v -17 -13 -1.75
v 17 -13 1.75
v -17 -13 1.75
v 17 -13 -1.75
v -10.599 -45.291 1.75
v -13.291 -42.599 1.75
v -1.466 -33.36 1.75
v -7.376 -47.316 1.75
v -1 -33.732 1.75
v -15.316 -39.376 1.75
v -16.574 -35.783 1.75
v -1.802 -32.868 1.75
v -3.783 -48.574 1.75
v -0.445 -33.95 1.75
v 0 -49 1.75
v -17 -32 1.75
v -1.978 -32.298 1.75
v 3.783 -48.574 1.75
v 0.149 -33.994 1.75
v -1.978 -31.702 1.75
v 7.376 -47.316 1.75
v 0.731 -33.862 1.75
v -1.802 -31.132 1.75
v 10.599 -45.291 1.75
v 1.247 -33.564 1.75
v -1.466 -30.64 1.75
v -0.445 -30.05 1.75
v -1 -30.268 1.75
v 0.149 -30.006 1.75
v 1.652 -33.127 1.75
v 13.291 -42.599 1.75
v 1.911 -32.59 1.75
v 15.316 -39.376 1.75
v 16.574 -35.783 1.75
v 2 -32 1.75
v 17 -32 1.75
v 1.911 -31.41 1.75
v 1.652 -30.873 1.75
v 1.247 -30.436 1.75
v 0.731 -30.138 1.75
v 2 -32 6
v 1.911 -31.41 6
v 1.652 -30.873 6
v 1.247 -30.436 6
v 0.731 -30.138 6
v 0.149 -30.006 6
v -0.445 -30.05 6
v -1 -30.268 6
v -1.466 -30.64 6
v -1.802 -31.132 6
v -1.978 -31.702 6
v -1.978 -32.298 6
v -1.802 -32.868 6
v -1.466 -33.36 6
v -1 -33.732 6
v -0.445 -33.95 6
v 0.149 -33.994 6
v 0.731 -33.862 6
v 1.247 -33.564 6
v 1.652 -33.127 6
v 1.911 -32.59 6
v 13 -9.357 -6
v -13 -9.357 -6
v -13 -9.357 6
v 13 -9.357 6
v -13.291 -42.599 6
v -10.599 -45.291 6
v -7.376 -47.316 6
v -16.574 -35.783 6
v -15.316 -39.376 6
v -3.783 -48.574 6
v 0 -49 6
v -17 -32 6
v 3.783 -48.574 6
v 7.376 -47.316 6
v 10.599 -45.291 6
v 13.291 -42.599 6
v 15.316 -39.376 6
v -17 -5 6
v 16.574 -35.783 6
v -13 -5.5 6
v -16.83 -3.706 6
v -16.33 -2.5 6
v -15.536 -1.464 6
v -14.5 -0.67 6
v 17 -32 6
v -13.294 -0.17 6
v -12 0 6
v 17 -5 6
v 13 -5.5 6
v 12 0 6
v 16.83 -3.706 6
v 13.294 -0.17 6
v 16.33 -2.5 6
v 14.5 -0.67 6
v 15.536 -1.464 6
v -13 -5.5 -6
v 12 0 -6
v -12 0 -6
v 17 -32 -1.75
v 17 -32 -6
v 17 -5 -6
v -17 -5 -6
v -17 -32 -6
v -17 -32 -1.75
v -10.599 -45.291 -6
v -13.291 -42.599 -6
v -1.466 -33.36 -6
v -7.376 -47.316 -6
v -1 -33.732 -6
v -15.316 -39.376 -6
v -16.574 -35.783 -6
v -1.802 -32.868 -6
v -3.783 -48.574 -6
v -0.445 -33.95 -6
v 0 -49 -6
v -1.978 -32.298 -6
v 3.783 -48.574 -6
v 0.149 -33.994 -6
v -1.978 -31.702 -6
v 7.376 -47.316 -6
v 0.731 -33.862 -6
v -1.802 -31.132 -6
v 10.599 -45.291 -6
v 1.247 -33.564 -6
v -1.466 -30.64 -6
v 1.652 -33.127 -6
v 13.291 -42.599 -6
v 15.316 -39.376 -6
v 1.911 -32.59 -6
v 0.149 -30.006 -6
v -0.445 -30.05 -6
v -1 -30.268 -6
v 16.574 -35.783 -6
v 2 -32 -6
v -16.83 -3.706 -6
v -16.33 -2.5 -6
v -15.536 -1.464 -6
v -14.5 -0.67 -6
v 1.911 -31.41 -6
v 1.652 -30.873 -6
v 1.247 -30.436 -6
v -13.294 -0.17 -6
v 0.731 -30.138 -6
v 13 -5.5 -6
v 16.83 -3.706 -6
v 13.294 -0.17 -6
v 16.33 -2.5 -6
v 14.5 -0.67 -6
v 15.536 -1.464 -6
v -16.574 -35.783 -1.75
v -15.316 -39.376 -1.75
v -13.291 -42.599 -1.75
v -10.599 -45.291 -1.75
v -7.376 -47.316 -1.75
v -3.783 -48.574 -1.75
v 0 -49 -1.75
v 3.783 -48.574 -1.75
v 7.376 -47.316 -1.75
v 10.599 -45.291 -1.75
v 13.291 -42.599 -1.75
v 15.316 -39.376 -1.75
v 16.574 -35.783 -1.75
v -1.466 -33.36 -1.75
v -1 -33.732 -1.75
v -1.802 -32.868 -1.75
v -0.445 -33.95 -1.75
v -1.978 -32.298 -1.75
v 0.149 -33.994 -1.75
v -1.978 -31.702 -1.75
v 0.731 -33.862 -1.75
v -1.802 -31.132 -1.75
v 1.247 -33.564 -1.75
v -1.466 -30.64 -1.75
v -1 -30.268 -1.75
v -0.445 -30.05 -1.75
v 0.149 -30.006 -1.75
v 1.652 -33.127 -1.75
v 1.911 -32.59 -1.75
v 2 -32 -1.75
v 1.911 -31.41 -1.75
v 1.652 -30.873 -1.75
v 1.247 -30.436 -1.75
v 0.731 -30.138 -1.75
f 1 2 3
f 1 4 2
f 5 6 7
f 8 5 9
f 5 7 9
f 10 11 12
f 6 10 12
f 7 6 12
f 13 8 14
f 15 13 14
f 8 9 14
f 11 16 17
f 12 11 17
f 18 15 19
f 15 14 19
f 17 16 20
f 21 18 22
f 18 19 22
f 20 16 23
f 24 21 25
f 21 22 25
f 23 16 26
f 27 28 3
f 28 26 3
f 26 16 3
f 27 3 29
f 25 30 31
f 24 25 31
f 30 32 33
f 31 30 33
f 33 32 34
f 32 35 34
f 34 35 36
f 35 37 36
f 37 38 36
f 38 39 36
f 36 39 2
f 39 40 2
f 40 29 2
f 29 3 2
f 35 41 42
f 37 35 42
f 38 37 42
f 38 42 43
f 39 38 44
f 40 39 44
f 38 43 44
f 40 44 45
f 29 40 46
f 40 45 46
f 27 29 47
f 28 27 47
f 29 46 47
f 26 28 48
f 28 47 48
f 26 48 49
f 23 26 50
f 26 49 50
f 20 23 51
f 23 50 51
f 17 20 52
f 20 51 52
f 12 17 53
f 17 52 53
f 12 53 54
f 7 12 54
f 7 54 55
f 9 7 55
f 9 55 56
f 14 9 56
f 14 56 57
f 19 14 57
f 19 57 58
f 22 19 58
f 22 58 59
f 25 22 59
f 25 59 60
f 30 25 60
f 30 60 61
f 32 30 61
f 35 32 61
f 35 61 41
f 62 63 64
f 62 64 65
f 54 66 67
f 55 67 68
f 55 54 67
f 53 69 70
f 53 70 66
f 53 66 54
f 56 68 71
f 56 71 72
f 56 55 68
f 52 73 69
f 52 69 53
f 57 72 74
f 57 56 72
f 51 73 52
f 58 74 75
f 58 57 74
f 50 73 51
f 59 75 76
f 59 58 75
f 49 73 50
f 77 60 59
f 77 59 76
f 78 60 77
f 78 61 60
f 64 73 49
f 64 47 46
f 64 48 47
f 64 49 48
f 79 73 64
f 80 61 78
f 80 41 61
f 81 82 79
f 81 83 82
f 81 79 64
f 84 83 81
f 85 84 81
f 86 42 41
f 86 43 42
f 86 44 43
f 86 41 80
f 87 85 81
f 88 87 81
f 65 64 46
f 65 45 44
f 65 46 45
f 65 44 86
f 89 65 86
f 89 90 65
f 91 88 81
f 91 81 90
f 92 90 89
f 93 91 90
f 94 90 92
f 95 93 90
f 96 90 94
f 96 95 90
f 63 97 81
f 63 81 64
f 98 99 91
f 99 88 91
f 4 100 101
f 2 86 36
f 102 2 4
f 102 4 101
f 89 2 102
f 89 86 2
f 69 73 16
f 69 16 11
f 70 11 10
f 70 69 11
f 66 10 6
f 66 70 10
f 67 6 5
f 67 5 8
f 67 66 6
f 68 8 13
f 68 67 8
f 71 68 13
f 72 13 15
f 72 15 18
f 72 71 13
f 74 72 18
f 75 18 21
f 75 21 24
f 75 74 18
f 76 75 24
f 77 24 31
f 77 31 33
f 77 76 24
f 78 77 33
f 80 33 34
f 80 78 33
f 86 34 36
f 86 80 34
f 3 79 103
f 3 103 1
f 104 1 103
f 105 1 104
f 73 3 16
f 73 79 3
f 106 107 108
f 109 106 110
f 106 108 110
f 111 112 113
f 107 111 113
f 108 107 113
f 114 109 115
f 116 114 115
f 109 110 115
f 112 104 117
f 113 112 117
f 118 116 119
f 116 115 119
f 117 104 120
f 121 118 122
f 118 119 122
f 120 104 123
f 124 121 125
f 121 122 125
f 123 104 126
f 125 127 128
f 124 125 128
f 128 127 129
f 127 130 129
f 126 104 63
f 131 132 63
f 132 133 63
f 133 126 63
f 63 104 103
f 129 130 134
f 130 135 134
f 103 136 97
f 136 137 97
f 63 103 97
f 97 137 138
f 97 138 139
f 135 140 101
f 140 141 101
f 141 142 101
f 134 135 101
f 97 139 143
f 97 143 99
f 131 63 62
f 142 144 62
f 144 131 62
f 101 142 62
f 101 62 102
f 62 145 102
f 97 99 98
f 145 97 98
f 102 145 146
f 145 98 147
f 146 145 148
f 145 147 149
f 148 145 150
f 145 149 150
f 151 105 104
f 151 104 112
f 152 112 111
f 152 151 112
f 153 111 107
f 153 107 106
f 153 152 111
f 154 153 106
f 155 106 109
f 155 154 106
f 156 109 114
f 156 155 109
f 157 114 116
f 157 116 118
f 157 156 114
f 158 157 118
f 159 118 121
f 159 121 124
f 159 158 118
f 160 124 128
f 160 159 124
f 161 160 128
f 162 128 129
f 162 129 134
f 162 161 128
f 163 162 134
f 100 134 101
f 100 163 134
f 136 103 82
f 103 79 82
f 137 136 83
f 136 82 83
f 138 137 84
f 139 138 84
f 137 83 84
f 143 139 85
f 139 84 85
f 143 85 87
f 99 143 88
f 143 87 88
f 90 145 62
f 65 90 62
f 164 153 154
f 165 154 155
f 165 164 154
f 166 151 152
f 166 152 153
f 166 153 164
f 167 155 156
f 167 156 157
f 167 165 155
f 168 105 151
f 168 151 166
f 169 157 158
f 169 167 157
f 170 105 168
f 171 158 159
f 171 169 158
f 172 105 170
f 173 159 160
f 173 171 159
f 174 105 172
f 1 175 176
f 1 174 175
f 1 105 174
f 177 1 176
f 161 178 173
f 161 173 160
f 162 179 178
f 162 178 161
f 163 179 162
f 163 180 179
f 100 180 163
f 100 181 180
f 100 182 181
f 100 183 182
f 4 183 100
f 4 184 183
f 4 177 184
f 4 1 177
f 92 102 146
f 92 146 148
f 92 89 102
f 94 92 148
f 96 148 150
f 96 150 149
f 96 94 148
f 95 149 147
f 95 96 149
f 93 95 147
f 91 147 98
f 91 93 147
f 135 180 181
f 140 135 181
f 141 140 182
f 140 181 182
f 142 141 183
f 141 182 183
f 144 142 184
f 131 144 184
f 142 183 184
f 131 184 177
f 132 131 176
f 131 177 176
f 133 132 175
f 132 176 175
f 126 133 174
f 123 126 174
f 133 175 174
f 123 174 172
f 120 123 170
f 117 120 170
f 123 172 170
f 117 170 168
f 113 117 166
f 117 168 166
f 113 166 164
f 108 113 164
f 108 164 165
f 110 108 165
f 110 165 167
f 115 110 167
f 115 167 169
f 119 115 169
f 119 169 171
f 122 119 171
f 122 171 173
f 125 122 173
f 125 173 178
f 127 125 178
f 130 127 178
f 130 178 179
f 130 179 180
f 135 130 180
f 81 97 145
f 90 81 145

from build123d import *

# Parameters (mm, degrees)
F0_W          = 34
F0_H          = 12
F1_DEPTH      = 15
F2_W          = 26
F2_H          = 3.8571179805
F3_DEPTH      = 25
F5_DEPTH      = 6
F5_DEPTH_BACK = 6
F6_R          = 2
F7_DEPTH      = 25
F9_DEPTH      = 1.75
F9_DEPTH_BACK = 1.75
F10_R         = 5


with BuildPart() as f1:
    # F0 (on Front) → F1 (new body)
    with BuildSketch(Plane.XZ):
        Rectangle(F0_W, F0_H)
    extrude(amount=F1_DEPTH)

    # F2 (on face) → F3 (cut)
    with BuildSketch(Plane(origin=(0, 0, -6), x_dir=(1, 0, 0), z_dir=(0, 0, -1))):
        with Locations((0, 7.4285589902)):
            Rectangle(F2_W, F2_H)
    extrude(amount=-F3_DEPTH, mode=Mode.SUBTRACT)

    # F4 (on Top) → F5 (join, two sides)
    with BuildSketch(Plane.XY) as f5_sk:
        with BuildLine():
            Line((-17, -15), (-17, -32))
            ThreePointArc((-17, -32), (0, -49), (17, -32))
            Line((17, -32), (17, -15))
            Line((17, -15), (-17, -15))
        make_face()
    extrude(amount=F5_DEPTH)
    extrude(f5_sk.sketch, amount=-F5_DEPTH_BACK)

    # F6 (on face) → F7 (cut)
    with BuildSketch(Plane.XY.offset(6)):
        with Locations((0, -32)):
            Circle(F6_R)
    extrude(amount=-F7_DEPTH, mode=Mode.SUBTRACT)

    # F8 (on Top) → F9 (cut, two sides)
    with BuildSketch(Plane.XY) as f9_sk:
        with BuildLine():
            Line((-17, -13), (-17, -32))
            ThreePointArc((-17, -32), (0, -49), (17, -32))
            Line((17, -32), (17, -13))
            Line((17, -13), (0, -13))
            Line((0, -13), (-17, -13))
        make_face()
    extrude(amount=-F9_DEPTH, mode=Mode.SUBTRACT)
    extrude(f9_sk.sketch, amount=F9_DEPTH_BACK, mode=Mode.SUBTRACT)

    # F10
    f10_edges = [f1.edges().sort_by_distance(p)[0] for p in [
        (-17, 0, 0),
        (17, 0, 0),
    ]]
    fillet(f10_edges, radius=F10_R)


solid = f1.part
